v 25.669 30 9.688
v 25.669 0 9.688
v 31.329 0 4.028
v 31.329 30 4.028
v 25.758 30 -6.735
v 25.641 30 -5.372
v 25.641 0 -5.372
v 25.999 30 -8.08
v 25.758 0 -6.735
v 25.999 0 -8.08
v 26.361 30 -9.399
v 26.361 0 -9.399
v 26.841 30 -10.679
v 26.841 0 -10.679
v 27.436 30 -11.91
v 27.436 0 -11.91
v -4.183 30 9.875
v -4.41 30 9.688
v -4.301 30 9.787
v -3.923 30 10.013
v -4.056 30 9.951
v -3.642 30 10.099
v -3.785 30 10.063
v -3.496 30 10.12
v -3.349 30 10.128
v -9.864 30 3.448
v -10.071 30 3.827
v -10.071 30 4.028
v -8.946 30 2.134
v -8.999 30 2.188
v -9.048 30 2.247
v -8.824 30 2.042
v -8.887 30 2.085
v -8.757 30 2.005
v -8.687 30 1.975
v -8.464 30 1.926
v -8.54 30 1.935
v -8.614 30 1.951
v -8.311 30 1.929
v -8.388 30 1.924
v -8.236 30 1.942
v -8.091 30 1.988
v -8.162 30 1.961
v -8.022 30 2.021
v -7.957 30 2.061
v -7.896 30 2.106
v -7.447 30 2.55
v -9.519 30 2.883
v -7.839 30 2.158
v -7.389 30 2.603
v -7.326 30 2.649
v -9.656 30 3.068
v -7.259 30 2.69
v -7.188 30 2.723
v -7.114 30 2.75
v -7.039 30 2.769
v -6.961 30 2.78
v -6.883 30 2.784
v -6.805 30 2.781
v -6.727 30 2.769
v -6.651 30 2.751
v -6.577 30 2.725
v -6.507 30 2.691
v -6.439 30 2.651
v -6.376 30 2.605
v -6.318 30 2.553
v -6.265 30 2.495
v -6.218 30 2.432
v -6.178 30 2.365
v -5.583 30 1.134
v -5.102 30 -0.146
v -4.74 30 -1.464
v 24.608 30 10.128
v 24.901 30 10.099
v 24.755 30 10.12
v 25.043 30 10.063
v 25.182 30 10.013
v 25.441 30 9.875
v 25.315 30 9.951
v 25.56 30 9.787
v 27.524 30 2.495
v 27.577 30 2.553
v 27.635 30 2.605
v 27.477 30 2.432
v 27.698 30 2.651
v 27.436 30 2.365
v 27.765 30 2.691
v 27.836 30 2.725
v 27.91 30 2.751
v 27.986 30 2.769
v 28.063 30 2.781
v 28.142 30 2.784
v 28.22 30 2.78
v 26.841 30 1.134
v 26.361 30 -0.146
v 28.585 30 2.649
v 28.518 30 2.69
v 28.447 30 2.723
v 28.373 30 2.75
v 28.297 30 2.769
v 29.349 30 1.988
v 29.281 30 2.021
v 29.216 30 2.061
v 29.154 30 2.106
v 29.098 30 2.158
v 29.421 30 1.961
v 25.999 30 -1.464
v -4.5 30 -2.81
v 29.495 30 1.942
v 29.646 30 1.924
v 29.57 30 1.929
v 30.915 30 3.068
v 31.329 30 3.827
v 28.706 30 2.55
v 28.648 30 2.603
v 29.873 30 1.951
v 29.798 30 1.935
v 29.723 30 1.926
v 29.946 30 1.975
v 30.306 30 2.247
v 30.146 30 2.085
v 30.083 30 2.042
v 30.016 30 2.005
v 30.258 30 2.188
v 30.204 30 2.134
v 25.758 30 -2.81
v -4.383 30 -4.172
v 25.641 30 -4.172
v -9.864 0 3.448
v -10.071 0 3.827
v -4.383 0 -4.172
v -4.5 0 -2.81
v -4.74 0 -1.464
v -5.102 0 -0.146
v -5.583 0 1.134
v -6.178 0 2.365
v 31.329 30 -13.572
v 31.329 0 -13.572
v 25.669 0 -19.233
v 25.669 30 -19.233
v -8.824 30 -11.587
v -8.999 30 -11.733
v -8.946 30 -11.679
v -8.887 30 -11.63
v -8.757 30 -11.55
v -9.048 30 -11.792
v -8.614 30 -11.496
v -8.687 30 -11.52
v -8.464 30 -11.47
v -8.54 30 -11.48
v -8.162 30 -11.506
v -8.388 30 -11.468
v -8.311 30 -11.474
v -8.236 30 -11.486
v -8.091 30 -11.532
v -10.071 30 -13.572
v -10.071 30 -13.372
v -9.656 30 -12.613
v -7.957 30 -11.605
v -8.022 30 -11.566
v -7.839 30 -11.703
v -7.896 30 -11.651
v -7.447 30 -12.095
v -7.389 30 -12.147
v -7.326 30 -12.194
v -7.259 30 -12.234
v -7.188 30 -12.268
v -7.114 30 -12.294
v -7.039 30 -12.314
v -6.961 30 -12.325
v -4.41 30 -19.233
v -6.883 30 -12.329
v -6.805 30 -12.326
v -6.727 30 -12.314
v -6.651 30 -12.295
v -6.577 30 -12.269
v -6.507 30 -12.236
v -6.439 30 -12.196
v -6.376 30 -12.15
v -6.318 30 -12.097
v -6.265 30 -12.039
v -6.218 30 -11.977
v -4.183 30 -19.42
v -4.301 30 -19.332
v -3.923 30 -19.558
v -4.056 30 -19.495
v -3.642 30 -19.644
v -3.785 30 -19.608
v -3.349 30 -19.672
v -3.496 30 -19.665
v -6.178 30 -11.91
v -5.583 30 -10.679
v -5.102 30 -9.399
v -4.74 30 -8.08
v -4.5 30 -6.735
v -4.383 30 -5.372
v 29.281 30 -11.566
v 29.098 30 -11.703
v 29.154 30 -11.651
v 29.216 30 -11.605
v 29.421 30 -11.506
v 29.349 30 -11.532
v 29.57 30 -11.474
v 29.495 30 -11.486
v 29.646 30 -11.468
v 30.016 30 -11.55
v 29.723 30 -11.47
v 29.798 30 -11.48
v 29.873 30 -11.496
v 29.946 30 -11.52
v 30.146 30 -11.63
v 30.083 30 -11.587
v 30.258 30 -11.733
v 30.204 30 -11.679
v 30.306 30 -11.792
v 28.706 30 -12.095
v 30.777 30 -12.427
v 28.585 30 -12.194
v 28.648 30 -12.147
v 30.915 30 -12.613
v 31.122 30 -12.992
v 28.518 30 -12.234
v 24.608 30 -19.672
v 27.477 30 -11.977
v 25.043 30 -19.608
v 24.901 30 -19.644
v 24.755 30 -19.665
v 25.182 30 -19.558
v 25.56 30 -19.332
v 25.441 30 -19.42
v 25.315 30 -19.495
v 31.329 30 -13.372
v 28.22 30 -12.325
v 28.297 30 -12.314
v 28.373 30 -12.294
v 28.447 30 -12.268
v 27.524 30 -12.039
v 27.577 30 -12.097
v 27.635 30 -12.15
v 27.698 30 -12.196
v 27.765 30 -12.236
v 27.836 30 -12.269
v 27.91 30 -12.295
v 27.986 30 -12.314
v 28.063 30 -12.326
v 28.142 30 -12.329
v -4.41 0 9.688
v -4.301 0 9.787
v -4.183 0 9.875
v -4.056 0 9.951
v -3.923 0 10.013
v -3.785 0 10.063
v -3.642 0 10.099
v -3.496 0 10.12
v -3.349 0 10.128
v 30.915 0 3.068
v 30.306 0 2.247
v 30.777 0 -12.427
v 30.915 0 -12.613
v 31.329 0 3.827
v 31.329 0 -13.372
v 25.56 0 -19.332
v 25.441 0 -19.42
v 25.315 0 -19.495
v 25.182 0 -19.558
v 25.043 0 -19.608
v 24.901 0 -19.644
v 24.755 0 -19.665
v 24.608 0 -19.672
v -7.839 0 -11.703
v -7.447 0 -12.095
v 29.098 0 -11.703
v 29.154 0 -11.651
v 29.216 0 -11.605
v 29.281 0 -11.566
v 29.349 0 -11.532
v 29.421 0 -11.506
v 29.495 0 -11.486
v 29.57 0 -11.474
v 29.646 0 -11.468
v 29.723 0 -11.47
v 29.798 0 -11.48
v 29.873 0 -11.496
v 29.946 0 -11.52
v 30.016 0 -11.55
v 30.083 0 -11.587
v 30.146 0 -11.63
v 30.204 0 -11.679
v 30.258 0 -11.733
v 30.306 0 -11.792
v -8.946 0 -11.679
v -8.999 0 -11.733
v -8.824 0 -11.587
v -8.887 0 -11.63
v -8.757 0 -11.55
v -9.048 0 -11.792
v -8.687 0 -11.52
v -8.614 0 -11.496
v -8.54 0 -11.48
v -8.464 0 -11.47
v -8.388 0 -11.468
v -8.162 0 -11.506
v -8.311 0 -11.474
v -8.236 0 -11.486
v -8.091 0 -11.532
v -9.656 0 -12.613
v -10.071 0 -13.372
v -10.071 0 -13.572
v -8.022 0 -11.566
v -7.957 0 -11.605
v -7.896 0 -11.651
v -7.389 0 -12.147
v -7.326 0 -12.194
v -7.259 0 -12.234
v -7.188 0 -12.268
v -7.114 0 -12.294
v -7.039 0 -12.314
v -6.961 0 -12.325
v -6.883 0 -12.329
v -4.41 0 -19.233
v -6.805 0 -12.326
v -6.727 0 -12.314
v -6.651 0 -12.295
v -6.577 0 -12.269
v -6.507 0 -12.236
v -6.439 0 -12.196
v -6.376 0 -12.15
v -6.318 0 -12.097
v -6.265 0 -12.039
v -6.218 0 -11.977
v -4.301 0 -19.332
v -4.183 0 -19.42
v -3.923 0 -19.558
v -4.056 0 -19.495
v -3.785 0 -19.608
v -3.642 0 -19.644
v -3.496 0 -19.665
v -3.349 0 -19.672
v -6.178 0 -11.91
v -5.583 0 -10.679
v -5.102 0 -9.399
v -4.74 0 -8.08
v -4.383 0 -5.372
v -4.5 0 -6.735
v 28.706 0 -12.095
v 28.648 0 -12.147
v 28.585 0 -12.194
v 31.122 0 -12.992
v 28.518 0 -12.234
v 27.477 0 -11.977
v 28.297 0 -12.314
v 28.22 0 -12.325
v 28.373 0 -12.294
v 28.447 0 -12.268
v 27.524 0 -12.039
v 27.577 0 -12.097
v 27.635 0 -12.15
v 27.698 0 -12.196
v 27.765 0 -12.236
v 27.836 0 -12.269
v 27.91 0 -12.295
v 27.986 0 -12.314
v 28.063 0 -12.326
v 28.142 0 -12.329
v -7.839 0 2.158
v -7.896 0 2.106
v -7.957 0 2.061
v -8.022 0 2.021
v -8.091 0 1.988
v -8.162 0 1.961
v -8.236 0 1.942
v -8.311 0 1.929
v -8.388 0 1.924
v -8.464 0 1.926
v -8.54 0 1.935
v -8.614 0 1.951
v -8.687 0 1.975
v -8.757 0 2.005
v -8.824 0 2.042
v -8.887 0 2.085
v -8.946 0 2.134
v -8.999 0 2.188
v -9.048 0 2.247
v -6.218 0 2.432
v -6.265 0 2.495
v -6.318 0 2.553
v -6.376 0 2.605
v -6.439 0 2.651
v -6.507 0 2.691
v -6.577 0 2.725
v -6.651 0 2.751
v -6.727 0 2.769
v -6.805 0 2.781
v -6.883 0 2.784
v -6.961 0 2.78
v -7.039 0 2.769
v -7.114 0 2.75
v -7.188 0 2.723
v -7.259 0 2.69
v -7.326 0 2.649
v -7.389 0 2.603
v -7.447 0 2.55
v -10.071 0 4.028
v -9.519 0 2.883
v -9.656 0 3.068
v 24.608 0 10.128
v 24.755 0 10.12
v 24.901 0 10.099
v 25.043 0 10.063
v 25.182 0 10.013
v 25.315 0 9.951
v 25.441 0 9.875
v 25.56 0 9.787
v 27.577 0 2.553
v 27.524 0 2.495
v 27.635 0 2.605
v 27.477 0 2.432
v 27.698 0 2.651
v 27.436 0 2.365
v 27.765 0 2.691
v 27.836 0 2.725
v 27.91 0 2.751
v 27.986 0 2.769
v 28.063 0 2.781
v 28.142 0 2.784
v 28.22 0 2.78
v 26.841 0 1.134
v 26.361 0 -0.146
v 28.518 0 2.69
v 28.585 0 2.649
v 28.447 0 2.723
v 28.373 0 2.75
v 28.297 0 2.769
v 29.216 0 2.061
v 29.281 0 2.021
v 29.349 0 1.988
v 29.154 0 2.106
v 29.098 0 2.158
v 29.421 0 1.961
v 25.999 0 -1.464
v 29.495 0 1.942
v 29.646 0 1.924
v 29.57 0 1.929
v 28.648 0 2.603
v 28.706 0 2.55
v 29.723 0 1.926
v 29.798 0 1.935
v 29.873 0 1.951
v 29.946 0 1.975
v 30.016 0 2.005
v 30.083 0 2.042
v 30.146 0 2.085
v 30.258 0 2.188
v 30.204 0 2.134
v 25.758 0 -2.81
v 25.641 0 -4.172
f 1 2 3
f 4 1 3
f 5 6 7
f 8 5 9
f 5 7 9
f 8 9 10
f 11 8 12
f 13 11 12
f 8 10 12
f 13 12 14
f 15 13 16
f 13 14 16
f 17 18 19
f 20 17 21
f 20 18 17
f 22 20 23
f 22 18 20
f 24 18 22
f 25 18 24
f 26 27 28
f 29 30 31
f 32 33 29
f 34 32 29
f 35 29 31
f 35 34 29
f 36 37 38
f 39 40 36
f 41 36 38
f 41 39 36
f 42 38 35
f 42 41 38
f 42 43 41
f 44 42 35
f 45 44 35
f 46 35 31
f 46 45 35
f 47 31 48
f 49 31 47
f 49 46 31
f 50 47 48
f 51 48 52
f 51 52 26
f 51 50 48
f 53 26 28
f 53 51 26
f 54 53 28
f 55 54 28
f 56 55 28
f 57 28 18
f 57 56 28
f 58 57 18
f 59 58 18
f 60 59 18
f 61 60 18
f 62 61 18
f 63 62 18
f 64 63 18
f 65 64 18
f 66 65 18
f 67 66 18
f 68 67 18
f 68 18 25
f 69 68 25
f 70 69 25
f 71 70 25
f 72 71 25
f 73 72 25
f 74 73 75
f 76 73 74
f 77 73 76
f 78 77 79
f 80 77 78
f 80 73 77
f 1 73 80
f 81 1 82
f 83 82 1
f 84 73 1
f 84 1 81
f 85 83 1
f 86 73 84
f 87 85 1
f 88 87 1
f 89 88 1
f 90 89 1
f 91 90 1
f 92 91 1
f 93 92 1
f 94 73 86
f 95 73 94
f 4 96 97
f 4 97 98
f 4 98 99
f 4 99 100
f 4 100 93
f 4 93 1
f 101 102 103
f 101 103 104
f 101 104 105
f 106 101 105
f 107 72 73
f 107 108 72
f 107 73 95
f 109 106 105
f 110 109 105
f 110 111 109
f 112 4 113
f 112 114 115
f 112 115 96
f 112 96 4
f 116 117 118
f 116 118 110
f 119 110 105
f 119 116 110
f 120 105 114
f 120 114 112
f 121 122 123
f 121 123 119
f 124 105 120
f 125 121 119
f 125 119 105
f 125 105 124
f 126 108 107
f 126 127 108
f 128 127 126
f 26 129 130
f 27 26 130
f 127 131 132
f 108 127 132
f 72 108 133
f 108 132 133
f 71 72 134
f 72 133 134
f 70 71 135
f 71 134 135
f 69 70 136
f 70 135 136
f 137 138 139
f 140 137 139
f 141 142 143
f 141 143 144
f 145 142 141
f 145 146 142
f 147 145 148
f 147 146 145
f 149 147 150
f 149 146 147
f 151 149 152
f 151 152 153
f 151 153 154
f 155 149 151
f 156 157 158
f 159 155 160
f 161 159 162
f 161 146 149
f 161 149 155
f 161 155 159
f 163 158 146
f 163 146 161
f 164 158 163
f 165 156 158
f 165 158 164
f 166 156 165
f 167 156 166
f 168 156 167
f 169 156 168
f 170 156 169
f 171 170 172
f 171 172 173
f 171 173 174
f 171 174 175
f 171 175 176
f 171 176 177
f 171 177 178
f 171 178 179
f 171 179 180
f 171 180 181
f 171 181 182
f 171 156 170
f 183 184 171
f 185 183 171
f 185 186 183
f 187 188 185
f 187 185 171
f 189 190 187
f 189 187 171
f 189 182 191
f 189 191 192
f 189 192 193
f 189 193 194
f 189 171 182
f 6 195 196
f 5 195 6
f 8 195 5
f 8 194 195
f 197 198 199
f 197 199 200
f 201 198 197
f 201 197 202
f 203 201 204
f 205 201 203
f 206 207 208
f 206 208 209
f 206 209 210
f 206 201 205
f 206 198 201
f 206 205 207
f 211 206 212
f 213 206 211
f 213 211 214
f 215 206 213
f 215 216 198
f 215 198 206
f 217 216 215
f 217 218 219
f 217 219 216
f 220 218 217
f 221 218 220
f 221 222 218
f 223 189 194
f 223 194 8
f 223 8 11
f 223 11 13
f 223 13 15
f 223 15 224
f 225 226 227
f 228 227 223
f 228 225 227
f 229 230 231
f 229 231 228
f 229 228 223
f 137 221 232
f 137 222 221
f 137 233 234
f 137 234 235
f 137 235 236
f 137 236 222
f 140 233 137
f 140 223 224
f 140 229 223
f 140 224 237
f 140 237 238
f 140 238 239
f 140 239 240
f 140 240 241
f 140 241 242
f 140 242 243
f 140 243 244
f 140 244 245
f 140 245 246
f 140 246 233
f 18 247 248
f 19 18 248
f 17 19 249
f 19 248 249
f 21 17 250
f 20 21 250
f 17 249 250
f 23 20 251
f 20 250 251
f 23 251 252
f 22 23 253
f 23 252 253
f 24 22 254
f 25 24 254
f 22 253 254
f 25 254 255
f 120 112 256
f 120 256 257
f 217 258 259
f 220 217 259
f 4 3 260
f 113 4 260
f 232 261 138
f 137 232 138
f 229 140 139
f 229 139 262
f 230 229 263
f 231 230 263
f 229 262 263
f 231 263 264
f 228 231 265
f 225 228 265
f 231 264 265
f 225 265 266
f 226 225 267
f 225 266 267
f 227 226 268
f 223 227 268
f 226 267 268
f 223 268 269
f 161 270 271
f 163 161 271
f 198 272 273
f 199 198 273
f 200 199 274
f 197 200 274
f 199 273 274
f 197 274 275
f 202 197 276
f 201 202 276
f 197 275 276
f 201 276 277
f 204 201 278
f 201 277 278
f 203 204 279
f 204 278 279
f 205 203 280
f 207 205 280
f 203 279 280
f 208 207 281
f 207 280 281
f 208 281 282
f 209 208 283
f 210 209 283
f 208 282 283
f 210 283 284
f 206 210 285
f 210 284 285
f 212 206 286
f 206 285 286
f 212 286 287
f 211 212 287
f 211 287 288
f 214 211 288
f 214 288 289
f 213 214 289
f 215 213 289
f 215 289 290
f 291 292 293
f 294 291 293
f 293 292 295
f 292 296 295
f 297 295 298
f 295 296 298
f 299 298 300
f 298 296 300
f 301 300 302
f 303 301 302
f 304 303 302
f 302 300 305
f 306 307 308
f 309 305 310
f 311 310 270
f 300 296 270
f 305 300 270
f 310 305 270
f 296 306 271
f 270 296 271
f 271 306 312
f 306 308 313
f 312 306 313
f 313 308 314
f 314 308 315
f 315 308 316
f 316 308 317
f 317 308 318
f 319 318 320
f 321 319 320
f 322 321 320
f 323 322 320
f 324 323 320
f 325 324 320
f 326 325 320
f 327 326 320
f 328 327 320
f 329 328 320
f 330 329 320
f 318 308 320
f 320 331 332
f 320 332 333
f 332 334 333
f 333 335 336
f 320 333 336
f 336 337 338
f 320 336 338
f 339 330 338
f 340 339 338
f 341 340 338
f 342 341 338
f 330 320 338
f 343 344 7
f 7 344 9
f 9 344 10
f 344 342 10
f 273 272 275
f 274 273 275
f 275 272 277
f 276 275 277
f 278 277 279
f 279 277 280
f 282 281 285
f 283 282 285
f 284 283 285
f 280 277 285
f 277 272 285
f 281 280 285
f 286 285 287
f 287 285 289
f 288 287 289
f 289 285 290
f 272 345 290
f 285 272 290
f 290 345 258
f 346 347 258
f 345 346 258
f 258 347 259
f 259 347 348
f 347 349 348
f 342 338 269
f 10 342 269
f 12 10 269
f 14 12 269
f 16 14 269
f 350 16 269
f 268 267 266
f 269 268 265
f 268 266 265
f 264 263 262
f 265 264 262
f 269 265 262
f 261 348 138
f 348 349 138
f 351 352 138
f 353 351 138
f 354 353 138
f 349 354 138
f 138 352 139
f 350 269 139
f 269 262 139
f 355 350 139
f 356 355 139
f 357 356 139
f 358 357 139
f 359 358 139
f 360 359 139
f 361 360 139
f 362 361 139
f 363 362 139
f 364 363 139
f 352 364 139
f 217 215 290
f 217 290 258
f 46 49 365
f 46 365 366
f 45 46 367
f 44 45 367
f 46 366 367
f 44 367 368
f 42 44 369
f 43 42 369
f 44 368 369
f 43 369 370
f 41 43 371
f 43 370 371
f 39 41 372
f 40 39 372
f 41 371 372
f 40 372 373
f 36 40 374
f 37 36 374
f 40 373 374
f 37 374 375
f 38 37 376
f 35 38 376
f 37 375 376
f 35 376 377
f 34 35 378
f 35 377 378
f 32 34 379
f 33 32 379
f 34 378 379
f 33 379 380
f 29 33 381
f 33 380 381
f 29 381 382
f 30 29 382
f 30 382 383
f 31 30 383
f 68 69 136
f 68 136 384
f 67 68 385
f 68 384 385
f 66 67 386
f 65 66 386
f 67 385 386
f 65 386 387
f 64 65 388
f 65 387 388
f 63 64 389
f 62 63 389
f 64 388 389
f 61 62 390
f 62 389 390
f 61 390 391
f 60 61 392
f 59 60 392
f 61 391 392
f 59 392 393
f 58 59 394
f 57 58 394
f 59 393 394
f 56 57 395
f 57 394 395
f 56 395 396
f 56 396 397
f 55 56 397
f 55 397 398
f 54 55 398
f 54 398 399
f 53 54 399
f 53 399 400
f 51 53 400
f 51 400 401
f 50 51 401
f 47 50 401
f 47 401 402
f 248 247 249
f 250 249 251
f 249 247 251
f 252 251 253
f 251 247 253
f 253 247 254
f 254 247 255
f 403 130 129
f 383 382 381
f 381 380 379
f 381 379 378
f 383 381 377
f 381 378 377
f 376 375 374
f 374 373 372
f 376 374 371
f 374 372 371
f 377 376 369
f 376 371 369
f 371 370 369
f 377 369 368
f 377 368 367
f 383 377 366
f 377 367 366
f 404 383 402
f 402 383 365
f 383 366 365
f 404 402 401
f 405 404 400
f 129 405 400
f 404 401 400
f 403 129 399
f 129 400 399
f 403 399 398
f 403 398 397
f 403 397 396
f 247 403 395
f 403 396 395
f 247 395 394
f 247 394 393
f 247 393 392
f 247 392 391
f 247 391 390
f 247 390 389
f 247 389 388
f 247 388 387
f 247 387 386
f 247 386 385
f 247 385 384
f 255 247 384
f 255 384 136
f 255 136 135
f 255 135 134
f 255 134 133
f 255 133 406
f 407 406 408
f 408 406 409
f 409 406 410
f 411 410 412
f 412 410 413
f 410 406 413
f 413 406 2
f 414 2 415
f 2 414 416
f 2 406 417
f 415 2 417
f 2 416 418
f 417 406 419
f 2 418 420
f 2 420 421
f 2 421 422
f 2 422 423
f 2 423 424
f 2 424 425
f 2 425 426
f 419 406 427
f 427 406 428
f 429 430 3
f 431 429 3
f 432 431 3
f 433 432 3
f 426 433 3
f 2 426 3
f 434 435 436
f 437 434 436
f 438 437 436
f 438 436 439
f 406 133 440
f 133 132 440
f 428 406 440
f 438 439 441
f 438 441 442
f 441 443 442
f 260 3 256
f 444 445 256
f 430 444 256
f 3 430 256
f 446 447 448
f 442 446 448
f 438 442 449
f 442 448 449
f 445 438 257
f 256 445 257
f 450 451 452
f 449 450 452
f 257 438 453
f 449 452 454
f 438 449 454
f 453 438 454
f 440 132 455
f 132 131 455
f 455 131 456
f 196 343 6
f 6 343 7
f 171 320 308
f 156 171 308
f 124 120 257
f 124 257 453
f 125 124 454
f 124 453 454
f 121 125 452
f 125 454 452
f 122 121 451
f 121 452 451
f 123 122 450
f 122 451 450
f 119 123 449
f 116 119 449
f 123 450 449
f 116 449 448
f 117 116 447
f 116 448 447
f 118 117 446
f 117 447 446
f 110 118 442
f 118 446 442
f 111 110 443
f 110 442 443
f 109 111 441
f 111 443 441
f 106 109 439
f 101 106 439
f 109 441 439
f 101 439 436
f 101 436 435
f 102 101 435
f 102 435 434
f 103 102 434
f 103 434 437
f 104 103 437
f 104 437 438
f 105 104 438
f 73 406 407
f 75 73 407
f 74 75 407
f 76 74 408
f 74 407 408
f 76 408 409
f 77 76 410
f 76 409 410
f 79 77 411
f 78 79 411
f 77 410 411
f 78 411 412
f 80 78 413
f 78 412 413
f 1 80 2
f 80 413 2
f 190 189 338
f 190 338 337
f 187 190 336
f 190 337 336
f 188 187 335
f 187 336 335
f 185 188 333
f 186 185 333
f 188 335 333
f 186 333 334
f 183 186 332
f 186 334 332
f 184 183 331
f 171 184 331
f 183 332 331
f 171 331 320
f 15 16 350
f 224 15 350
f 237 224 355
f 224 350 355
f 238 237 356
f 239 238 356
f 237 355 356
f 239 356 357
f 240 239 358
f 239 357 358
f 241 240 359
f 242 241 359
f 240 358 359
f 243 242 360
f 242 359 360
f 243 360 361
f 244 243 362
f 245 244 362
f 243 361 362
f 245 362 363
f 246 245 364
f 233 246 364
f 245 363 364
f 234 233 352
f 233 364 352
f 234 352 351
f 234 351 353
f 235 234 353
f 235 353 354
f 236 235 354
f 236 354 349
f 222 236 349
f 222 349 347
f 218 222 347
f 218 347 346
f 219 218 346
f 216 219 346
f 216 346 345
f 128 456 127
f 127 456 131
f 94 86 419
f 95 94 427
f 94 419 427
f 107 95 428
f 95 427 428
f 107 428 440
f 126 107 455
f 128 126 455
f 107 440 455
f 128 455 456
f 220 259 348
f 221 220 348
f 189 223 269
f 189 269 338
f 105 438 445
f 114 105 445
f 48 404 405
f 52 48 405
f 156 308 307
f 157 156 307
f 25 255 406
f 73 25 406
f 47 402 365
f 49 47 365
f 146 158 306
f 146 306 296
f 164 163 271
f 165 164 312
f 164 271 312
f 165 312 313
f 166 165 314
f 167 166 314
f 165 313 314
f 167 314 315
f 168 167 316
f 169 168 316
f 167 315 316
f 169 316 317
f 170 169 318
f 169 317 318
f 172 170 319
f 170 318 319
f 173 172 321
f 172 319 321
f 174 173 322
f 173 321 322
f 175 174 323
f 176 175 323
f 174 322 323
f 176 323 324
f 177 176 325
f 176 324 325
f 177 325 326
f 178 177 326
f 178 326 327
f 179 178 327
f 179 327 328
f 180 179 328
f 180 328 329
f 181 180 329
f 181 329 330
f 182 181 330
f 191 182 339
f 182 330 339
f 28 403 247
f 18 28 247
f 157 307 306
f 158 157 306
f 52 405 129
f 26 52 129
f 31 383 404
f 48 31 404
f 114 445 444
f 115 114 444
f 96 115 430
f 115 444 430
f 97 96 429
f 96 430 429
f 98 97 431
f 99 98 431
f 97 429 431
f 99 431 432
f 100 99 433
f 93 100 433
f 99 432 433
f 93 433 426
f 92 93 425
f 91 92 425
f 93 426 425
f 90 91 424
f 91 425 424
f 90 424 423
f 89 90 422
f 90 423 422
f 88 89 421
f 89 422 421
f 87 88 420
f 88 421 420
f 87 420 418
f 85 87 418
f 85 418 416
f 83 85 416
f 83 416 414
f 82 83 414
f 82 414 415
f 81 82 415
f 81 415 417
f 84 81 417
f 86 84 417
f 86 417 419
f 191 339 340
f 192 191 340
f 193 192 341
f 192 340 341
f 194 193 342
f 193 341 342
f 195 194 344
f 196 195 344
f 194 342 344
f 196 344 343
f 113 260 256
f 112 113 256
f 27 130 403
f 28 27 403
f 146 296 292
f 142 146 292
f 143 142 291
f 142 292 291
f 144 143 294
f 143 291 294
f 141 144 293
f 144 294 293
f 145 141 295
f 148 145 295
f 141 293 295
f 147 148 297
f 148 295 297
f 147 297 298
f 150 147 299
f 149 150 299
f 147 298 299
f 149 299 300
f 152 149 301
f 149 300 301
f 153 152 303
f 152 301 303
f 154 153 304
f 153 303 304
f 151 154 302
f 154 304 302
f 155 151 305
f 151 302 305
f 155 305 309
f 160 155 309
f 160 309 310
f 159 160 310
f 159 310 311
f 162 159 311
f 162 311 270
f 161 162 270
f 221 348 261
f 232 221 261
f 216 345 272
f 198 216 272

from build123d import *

# Parameters (mm, degrees)
BOSS_EXTRUDE1_DEPTH   = 30
BOSS_EXTRUDE1_2_DEPTH = 30


with BuildPart() as part:
    # Sketch2 → Boss-Extrude1 (new body)
    with BuildSketch(Plane(origin=(0, 0, 0), x_dir=(1, 0, 0), z_dir=(0, 1, 0))):
        with BuildLine():
            Line((-10.070652174, -4.027639752), (-4.409992002, -9.688299923))
            ThreePointArc((-4.409992002, -9.688299923), (-3.923356979, -10.01345905), (-3.34933183, -10.127639752))
            Line((-3.34933183, -10.127639752), (24.608027482, -10.127639752))
            ThreePointArc((24.608027482, -10.127639752), (25.182052631, -10.01345905), (25.668687654, -9.688299923))
            Line((25.668687654, -9.688299923), (31.329347826, -4.027639752))
            Line((31.329347826, -4.027639752), (31.329347826, -3.827111907))
            Line((31.329347826, -3.827111907), (30.915087808, -3.06843312))
            Line((30.915087808, -3.06843312), (30.306332979, -2.247132238))
            ThreePointArc((30.306332979, -2.247132238), (29.722596461, -1.925684234), (29.097945483, -2.157822764))
            Line((29.097945483, -2.157822764), (28.705622633, -2.550145614))
            ThreePointArc((28.705622633, -2.550145614), (28.024545944, -2.776094483), (27.436308441, -2.365126129))
            ThreePointArc((27.436308441, -2.365126129), (26.164654274, 0.800881877), (25.64135263, 4.172360248))
            Line((25.64135263, 4.172360248), (-4.382656977, 4.172360248))
            ThreePointArc((-4.382656977, 4.172360248), (-4.905958622, 0.800881877), (-6.177612789, -2.365126129))
            ThreePointArc((-6.177612789, -2.365126129), (-6.765850292, -2.776094483), (-7.446926981, -2.550145614))
            Line((-7.446926981, -2.550145614), (-7.839249831, -2.157822764))
            ThreePointArc((-7.839249831, -2.157822764), (-8.463900809, -1.925684234), (-9.047637327, -2.247132238))
            Line((-9.047637327, -2.247132238), (-9.518644552, -2.882591098))
            Line((-9.518644552, -2.882591098), (-9.656392156, -3.06843312))
            Line((-9.656392156, -3.06843312), (-9.863522165, -3.447772514))
            Line((-9.863522165, -3.447772514), (-10.070652174, -3.827111907))
            Line((-10.070652174, -3.827111907), (-10.070652174, -4.027639752))
        make_face()
    extrude(amount=BOSS_EXTRUDE1_DEPTH)


with BuildPart() as body_2:
    # Sketch2 → Boss-Extrude1 2 (new body)
    with BuildSketch(Plane(origin=(0, 0, 0), x_dir=(1, 0, 0), z_dir=(0, 1, 0))):
        with BuildLine():
            Line((31.329347826, 13.572360248), (25.668687655, 19.23302042))
            ThreePointArc((25.668687655, 19.23302042), (25.182052631, 19.558179547), (24.608027483, 19.672360248))
            Line((24.608027483, 19.672360248), (-3.34933183, 19.672360248))
            ThreePointArc((-3.34933183, 19.672360248), (-3.923356979, 19.558179547), (-4.409992002, 19.23302042))
            Line((-4.409992002, 19.23302042), (-10.070652174, 13.572360248))
            Line((-10.070652174, 13.572360248), (-10.070652174, 13.371832404))
            Line((-10.070652174, 13.371832404), (-9.656392155, 12.613153617))
            Line((-9.656392155, 12.613153617), (-9.047637327, 11.791852734))
            ThreePointArc((-9.047637327, 11.791852734), (-8.463900808, 11.470404731), (-7.83924983, 11.702543261))
            Line((-7.83924983, 11.702543261), (-7.446926981, 12.09486611))
            ThreePointArc((-7.446926981, 12.09486611), (-6.765850292, 12.32081498), (-6.177612789, 11.909846626))
            ThreePointArc((-6.177612789, 11.909846626), (-4.905958622, 8.743838619), (-4.382656977, 5.372360248))
            Line((-4.382656977, 5.372360248), (25.64135263, 5.372360248))
            ThreePointArc((25.64135263, 5.372360248), (26.164654275, 8.743838618), (27.436308441, 11.909846624))
            ThreePointArc((27.436308441, 11.909846624), (28.024545944, 12.320814978), (28.705622633, 12.094866109))
            Line((28.705622633, 12.094866109), (29.097945483, 11.702543259))
            ThreePointArc((29.097945483, 11.702543259), (29.722596462, 11.47040473), (30.30633298, 11.791852734))
            Line((30.30633298, 11.791852734), (30.777340205, 12.427311595))
            Line((30.777340205, 12.427311595), (30.915087808, 12.613153617))
            Line((30.915087808, 12.613153617), (31.122217817, 12.99249301))
            Line((31.122217817, 12.99249301), (31.329347826, 13.371832404))
            Line((31.329347826, 13.371832404), (31.329347826, 13.572360248))
        make_face()
    extrude(amount=BOSS_EXTRUDE1_2_DEPTH)


solid = Compound([part.part, body_2.part])
